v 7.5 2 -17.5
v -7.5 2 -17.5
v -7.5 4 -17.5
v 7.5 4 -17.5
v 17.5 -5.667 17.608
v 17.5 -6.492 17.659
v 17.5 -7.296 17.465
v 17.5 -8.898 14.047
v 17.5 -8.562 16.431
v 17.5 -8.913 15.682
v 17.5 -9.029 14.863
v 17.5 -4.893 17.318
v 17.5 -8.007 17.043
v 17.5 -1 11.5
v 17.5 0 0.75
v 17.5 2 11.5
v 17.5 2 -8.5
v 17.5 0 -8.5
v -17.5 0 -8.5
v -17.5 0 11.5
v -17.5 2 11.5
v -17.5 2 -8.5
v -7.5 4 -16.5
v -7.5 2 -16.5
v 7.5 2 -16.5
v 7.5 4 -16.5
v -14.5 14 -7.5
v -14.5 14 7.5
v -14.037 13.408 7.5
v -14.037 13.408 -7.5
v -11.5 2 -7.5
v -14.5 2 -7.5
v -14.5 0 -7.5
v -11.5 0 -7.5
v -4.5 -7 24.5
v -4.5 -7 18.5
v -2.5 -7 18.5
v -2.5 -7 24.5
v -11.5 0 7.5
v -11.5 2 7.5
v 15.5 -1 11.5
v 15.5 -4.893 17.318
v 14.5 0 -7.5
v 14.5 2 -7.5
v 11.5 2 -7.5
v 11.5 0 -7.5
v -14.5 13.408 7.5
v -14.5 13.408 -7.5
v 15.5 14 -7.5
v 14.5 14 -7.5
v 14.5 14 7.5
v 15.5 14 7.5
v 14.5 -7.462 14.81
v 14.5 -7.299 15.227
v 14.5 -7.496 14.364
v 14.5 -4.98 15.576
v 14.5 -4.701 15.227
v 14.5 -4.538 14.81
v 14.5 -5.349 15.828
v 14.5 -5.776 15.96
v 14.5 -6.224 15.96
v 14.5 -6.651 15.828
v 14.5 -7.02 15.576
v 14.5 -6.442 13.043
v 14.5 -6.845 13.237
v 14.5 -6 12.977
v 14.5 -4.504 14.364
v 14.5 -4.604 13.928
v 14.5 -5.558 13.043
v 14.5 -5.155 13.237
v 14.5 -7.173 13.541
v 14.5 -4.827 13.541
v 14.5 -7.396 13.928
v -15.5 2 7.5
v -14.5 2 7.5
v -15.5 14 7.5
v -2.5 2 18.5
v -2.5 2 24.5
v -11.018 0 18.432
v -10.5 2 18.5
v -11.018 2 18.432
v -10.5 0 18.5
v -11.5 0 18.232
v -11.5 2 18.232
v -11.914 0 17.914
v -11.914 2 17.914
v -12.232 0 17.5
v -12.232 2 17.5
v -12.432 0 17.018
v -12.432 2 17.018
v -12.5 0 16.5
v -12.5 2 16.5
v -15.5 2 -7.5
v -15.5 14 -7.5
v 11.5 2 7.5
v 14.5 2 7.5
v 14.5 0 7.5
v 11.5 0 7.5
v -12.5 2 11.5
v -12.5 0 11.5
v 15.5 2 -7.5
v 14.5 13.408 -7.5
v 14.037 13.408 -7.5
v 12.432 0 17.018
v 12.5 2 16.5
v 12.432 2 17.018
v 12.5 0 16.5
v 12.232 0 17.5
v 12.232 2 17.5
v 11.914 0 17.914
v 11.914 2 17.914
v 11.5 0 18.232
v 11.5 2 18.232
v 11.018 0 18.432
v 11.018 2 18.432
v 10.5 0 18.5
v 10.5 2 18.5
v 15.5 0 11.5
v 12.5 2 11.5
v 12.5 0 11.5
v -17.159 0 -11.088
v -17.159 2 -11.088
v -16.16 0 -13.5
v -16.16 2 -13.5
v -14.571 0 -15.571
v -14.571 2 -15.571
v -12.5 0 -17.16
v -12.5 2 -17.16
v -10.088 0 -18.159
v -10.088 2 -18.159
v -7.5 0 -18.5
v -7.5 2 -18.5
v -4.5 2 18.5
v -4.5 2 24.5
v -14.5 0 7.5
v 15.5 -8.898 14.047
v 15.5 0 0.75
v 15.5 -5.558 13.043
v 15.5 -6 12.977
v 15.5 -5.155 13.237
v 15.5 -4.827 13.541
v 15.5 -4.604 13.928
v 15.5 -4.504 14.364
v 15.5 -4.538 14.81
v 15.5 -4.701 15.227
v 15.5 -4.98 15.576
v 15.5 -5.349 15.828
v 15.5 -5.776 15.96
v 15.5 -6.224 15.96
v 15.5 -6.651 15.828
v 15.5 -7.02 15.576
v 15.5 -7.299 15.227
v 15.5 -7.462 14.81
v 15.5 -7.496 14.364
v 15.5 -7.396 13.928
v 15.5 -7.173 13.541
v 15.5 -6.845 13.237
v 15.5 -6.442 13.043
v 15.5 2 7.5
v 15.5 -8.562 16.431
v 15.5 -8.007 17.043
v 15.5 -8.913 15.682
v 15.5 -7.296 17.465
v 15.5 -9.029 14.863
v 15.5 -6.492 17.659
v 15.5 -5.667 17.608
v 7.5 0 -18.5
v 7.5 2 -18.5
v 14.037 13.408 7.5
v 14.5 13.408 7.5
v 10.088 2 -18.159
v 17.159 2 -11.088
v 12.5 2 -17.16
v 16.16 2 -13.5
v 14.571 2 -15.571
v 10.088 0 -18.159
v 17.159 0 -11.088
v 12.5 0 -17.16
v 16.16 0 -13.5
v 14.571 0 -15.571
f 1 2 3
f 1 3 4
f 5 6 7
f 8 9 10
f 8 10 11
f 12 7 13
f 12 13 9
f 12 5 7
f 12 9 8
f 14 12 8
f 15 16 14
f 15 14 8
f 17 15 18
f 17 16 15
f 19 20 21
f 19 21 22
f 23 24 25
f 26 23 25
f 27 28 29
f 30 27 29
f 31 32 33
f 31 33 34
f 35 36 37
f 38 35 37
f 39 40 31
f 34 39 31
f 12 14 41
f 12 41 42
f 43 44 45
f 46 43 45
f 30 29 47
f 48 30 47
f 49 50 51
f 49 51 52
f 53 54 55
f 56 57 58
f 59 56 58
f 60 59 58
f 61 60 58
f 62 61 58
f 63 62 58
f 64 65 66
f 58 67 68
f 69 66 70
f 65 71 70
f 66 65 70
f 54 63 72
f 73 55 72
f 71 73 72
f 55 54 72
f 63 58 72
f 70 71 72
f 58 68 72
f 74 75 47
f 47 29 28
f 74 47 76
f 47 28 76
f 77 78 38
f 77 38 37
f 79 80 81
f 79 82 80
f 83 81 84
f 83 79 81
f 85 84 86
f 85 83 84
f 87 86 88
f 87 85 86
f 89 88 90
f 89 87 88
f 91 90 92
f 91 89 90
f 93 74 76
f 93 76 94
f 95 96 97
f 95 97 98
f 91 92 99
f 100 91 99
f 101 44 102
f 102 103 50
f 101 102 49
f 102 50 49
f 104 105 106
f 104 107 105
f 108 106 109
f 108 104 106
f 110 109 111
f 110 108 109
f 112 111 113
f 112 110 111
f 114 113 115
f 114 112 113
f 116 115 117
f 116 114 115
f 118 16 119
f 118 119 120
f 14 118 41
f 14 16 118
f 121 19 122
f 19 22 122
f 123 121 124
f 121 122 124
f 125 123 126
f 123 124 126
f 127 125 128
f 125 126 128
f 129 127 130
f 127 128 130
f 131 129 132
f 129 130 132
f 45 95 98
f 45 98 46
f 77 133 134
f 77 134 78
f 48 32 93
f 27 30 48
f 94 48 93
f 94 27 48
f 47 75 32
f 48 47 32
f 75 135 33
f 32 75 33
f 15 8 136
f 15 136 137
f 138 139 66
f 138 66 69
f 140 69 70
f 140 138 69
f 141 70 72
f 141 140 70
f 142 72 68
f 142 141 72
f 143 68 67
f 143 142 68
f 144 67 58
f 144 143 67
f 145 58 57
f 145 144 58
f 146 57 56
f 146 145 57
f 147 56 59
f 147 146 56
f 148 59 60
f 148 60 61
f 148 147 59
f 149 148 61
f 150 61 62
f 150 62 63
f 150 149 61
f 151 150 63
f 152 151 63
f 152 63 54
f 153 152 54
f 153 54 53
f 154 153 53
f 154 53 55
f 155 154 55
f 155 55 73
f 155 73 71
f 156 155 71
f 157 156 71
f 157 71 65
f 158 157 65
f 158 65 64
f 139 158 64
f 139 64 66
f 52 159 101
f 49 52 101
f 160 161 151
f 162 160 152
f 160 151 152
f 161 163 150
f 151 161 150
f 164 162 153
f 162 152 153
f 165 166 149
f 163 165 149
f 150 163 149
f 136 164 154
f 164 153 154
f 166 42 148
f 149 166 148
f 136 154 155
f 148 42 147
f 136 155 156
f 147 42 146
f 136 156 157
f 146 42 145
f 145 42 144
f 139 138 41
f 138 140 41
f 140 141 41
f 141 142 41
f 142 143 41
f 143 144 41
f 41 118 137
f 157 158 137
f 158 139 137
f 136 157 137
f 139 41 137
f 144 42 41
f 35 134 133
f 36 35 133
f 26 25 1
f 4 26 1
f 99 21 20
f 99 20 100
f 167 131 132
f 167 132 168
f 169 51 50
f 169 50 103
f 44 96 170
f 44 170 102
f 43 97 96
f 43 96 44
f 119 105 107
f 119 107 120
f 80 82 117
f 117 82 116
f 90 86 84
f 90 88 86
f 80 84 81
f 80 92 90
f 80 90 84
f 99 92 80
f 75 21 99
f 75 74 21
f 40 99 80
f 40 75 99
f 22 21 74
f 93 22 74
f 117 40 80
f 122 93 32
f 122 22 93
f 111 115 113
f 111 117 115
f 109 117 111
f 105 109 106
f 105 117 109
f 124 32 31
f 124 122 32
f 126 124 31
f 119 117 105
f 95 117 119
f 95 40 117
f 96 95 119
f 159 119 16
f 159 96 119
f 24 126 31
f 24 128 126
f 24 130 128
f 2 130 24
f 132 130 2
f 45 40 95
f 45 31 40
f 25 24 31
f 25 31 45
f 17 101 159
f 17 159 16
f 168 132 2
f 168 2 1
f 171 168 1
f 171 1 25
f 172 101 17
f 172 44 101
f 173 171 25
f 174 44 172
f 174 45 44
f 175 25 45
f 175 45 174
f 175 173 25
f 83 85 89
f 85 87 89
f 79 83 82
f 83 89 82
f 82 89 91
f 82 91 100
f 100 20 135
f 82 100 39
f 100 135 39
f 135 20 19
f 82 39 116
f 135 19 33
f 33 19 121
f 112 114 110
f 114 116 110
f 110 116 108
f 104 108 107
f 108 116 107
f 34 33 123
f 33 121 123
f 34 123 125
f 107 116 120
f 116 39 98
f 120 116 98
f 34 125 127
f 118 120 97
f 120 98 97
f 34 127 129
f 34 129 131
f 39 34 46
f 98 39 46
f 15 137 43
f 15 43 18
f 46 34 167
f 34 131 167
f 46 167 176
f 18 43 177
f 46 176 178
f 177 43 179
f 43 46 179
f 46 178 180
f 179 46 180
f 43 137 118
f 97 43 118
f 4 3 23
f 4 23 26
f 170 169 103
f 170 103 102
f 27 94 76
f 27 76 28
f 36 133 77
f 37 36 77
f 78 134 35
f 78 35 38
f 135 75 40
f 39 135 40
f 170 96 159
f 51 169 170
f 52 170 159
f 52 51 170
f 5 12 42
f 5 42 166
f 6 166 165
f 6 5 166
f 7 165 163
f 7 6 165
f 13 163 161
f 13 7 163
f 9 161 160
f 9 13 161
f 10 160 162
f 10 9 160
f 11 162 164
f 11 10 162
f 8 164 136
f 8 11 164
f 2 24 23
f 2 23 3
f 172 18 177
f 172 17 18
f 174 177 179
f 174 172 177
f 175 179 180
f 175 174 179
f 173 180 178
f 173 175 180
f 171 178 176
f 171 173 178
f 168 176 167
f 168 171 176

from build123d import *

# Parameters (mm, degrees)
SKETCH1_W           = 35
SKETCH1_H           = 37
BOSS_EXTRUDE1_DEPTH = 2
FILLET1_R           = 10
SKETCH2_W           = 15
SKETCH2_H           = 1
BOSS_EXTRUDE2_DEPTH = 2
CUT_EXTRUDE1_REACH  = 4
SKETCH3_W           = 5
SKETCH3_H           = 7
FILLET2_R           = 2
BOSS_EXTRUDE3_DEPTH = 2
SKETCH5_R           = 1.5
BOSS_EXTRUDE4_DEPTH = 3
SKETCH6_W           = 1
SKETCH6_H           = 15
BOSS_EXTRUDE5_DEPTH = 12
BOSS_EXTRUDE6_DEPTH = 15
SKETCH8_W           = 3
SKETCH8_H           = 15
CUT_EXTRUDE4_DEPTH  = 2
SKETCH11_W          = 2
SKETCH11_H          = 6
BOSS_EXTRUDE8_DEPTH = 9


with BuildPart() as part:
    # Sketch1 → Boss-Extrude1 (new body)
    with BuildSketch(Plane(origin=(0, 0, 0), x_dir=(1, 0, 0), z_dir=(0, 1, 0))):
        Rectangle(SKETCH1_W, SKETCH1_H)
    extrude(amount=BOSS_EXTRUDE1_DEPTH)

    # Fillet1
    fillet1_edges = [part.edges().sort_by_distance(p)[0] for p in [
        (-17.5, 1, -18.5),
        (17.5, 1, -18.5),
    ]]
    fillet(fillet1_edges, radius=FILLET1_R)

    # Sketch2 → Boss-Extrude2 (add)
    with BuildSketch(Plane(origin=(0, 2, 0), x_dir=(1, 0, 0), z_dir=(0, 1, 0))):
        with Locations((0, 17)):
            Rectangle(SKETCH2_W, SKETCH2_H)
    extrude(amount=BOSS_EXTRUDE2_DEPTH)

    # Sketch3 → Cut-Extrude1 (cut, up to next)
    with BuildSketch(Plane(origin=(0, 2, 0), x_dir=(1, 0, 0), z_dir=(0, 1, 0)), mode=Mode.PRIVATE) as cut_extrude1_sk1:
        with Locations((15, -15)):
            Rectangle(SKETCH3_W, SKETCH3_H)
    cut_extrude1_tool1 = extrude(cut_extrude1_sk1.sketch, amount=-CUT_EXTRUDE1_REACH, mode=Mode.PRIVATE) & part.part
    add(cut_extrude1_tool1.solids().sort_by_distance((15, 2, 15))[0], mode=Mode.SUBTRACT)
    # Sketch3 → Cut-Extrude1 (cut, up to next)
    with BuildSketch(Plane(origin=(0, 2, 0), x_dir=(1, 0, 0), z_dir=(0, 1, 0)), mode=Mode.PRIVATE) as cut_extrude1_sk2:
        with Locations((-15, -15)):
            Rectangle(SKETCH3_W, SKETCH3_H)
    cut_extrude1_tool2 = extrude(cut_extrude1_sk2.sketch, amount=-CUT_EXTRUDE1_REACH, mode=Mode.PRIVATE) & part.part
    add(cut_extrude1_tool2.solids().sort_by_distance((-15, 2, 15))[0], mode=Mode.SUBTRACT)

    # Fillet2
    fillet2_edges = [part.edges().sort_by_distance(p)[0] for p in [
        (12.5, 1, 18.5),
        (-12.5, 1, 18.5),
    ]]
    fillet(fillet2_edges, radius=FILLET2_R)

    # Sketch4 → Boss-Extrude3 (add)
    with BuildSketch(Plane(origin=(17.5, 0, 0), x_dir=(0, 0, -1), z_dir=(1, 0, 0))):
        with BuildLine():
            Line((-11.5, 0), (-11.5, -1))
            Line((-11.5, -1), (-17.31755328, -4.893080251))
            ThreePointArc((-17.31755328, -4.893080251), (-17.042817275, -8.006709978), (-14.046997598, -8.898469144))
            Line((-14.046997598, -8.898469144), (-0.749732959, 0))
            Line((-0.749732959, 0), (-11.5, 0))
        make_face()
    extrude(amount=-BOSS_EXTRUDE3_DEPTH)

    # Sketch5 → Boss-Extrude4 (add)
    with BuildSketch(Plane(origin=(17.5, 0, 0), x_dir=(0, 0, -1), z_dir=(1, 0, 0))):
        with Locations((-14.476503348, -6)):
            Circle(SKETCH5_R)
    extrude(amount=-BOSS_EXTRUDE4_DEPTH)

    # Sketch6 → Boss-Extrude5 (add)
    with BuildSketch(Plane(origin=(0, 2, 0), x_dir=(1, 0, 0), z_dir=(0, 1, 0))):
        with Locations((15, 0)):
            Rectangle(SKETCH6_W, SKETCH6_H)
        with Locations((-15, 0)):
            Rectangle(SKETCH6_W, SKETCH6_H)
    extrude(amount=BOSS_EXTRUDE5_DEPTH)

    # Sketch7 → Boss-Extrude6 (add)
    with BuildSketch(Plane.XY.offset(7.5)):
        Polygon((-14.5, 14), (-14.037063051, 13.408338163), (-14.5, 13.408338163), align=None)
    boss_extrude6 = extrude(amount=-BOSS_EXTRUDE6_DEPTH)

    # Mirror1: Boss-Extrude6 across plane
    add(boss_extrude6.mirror(Plane(origin=(0, 0, 0), x_dir=(0, 0, 1), z_dir=(1, 0, 0))))

    # Sketch8 → Cut-Extrude4 (cut)
    with BuildSketch(Plane(origin=(0, 2, 0), x_dir=(1, 0, 0), z_dir=(0, 1, 0))):
        with Locations((-13, 0)):
            Rectangle(SKETCH8_W, SKETCH8_H)
    cut_extrude4 = extrude(amount=-CUT_EXTRUDE4_DEPTH, mode=Mode.SUBTRACT)

    # Mirror2: Cut-Extrude4 across plane
    add(cut_extrude4.mirror(Plane(origin=(0, 0, 0), x_dir=(0, 0, 1), z_dir=(1, 0, 0))), mode=Mode.SUBTRACT)


with BuildPart() as body_2:
    # Sketch11 → Boss-Extrude8 (new body)
    with BuildSketch(Plane(origin=(0, 2, 0), x_dir=(1, 0, 0), z_dir=(0, 1, 0))):
        with Locations((-3.5, -21.5)):
            Rectangle(SKETCH11_W, SKETCH11_H)
    extrude(amount=-BOSS_EXTRUDE8_DEPTH)


solid = Compound([part.part, body_2.part])
